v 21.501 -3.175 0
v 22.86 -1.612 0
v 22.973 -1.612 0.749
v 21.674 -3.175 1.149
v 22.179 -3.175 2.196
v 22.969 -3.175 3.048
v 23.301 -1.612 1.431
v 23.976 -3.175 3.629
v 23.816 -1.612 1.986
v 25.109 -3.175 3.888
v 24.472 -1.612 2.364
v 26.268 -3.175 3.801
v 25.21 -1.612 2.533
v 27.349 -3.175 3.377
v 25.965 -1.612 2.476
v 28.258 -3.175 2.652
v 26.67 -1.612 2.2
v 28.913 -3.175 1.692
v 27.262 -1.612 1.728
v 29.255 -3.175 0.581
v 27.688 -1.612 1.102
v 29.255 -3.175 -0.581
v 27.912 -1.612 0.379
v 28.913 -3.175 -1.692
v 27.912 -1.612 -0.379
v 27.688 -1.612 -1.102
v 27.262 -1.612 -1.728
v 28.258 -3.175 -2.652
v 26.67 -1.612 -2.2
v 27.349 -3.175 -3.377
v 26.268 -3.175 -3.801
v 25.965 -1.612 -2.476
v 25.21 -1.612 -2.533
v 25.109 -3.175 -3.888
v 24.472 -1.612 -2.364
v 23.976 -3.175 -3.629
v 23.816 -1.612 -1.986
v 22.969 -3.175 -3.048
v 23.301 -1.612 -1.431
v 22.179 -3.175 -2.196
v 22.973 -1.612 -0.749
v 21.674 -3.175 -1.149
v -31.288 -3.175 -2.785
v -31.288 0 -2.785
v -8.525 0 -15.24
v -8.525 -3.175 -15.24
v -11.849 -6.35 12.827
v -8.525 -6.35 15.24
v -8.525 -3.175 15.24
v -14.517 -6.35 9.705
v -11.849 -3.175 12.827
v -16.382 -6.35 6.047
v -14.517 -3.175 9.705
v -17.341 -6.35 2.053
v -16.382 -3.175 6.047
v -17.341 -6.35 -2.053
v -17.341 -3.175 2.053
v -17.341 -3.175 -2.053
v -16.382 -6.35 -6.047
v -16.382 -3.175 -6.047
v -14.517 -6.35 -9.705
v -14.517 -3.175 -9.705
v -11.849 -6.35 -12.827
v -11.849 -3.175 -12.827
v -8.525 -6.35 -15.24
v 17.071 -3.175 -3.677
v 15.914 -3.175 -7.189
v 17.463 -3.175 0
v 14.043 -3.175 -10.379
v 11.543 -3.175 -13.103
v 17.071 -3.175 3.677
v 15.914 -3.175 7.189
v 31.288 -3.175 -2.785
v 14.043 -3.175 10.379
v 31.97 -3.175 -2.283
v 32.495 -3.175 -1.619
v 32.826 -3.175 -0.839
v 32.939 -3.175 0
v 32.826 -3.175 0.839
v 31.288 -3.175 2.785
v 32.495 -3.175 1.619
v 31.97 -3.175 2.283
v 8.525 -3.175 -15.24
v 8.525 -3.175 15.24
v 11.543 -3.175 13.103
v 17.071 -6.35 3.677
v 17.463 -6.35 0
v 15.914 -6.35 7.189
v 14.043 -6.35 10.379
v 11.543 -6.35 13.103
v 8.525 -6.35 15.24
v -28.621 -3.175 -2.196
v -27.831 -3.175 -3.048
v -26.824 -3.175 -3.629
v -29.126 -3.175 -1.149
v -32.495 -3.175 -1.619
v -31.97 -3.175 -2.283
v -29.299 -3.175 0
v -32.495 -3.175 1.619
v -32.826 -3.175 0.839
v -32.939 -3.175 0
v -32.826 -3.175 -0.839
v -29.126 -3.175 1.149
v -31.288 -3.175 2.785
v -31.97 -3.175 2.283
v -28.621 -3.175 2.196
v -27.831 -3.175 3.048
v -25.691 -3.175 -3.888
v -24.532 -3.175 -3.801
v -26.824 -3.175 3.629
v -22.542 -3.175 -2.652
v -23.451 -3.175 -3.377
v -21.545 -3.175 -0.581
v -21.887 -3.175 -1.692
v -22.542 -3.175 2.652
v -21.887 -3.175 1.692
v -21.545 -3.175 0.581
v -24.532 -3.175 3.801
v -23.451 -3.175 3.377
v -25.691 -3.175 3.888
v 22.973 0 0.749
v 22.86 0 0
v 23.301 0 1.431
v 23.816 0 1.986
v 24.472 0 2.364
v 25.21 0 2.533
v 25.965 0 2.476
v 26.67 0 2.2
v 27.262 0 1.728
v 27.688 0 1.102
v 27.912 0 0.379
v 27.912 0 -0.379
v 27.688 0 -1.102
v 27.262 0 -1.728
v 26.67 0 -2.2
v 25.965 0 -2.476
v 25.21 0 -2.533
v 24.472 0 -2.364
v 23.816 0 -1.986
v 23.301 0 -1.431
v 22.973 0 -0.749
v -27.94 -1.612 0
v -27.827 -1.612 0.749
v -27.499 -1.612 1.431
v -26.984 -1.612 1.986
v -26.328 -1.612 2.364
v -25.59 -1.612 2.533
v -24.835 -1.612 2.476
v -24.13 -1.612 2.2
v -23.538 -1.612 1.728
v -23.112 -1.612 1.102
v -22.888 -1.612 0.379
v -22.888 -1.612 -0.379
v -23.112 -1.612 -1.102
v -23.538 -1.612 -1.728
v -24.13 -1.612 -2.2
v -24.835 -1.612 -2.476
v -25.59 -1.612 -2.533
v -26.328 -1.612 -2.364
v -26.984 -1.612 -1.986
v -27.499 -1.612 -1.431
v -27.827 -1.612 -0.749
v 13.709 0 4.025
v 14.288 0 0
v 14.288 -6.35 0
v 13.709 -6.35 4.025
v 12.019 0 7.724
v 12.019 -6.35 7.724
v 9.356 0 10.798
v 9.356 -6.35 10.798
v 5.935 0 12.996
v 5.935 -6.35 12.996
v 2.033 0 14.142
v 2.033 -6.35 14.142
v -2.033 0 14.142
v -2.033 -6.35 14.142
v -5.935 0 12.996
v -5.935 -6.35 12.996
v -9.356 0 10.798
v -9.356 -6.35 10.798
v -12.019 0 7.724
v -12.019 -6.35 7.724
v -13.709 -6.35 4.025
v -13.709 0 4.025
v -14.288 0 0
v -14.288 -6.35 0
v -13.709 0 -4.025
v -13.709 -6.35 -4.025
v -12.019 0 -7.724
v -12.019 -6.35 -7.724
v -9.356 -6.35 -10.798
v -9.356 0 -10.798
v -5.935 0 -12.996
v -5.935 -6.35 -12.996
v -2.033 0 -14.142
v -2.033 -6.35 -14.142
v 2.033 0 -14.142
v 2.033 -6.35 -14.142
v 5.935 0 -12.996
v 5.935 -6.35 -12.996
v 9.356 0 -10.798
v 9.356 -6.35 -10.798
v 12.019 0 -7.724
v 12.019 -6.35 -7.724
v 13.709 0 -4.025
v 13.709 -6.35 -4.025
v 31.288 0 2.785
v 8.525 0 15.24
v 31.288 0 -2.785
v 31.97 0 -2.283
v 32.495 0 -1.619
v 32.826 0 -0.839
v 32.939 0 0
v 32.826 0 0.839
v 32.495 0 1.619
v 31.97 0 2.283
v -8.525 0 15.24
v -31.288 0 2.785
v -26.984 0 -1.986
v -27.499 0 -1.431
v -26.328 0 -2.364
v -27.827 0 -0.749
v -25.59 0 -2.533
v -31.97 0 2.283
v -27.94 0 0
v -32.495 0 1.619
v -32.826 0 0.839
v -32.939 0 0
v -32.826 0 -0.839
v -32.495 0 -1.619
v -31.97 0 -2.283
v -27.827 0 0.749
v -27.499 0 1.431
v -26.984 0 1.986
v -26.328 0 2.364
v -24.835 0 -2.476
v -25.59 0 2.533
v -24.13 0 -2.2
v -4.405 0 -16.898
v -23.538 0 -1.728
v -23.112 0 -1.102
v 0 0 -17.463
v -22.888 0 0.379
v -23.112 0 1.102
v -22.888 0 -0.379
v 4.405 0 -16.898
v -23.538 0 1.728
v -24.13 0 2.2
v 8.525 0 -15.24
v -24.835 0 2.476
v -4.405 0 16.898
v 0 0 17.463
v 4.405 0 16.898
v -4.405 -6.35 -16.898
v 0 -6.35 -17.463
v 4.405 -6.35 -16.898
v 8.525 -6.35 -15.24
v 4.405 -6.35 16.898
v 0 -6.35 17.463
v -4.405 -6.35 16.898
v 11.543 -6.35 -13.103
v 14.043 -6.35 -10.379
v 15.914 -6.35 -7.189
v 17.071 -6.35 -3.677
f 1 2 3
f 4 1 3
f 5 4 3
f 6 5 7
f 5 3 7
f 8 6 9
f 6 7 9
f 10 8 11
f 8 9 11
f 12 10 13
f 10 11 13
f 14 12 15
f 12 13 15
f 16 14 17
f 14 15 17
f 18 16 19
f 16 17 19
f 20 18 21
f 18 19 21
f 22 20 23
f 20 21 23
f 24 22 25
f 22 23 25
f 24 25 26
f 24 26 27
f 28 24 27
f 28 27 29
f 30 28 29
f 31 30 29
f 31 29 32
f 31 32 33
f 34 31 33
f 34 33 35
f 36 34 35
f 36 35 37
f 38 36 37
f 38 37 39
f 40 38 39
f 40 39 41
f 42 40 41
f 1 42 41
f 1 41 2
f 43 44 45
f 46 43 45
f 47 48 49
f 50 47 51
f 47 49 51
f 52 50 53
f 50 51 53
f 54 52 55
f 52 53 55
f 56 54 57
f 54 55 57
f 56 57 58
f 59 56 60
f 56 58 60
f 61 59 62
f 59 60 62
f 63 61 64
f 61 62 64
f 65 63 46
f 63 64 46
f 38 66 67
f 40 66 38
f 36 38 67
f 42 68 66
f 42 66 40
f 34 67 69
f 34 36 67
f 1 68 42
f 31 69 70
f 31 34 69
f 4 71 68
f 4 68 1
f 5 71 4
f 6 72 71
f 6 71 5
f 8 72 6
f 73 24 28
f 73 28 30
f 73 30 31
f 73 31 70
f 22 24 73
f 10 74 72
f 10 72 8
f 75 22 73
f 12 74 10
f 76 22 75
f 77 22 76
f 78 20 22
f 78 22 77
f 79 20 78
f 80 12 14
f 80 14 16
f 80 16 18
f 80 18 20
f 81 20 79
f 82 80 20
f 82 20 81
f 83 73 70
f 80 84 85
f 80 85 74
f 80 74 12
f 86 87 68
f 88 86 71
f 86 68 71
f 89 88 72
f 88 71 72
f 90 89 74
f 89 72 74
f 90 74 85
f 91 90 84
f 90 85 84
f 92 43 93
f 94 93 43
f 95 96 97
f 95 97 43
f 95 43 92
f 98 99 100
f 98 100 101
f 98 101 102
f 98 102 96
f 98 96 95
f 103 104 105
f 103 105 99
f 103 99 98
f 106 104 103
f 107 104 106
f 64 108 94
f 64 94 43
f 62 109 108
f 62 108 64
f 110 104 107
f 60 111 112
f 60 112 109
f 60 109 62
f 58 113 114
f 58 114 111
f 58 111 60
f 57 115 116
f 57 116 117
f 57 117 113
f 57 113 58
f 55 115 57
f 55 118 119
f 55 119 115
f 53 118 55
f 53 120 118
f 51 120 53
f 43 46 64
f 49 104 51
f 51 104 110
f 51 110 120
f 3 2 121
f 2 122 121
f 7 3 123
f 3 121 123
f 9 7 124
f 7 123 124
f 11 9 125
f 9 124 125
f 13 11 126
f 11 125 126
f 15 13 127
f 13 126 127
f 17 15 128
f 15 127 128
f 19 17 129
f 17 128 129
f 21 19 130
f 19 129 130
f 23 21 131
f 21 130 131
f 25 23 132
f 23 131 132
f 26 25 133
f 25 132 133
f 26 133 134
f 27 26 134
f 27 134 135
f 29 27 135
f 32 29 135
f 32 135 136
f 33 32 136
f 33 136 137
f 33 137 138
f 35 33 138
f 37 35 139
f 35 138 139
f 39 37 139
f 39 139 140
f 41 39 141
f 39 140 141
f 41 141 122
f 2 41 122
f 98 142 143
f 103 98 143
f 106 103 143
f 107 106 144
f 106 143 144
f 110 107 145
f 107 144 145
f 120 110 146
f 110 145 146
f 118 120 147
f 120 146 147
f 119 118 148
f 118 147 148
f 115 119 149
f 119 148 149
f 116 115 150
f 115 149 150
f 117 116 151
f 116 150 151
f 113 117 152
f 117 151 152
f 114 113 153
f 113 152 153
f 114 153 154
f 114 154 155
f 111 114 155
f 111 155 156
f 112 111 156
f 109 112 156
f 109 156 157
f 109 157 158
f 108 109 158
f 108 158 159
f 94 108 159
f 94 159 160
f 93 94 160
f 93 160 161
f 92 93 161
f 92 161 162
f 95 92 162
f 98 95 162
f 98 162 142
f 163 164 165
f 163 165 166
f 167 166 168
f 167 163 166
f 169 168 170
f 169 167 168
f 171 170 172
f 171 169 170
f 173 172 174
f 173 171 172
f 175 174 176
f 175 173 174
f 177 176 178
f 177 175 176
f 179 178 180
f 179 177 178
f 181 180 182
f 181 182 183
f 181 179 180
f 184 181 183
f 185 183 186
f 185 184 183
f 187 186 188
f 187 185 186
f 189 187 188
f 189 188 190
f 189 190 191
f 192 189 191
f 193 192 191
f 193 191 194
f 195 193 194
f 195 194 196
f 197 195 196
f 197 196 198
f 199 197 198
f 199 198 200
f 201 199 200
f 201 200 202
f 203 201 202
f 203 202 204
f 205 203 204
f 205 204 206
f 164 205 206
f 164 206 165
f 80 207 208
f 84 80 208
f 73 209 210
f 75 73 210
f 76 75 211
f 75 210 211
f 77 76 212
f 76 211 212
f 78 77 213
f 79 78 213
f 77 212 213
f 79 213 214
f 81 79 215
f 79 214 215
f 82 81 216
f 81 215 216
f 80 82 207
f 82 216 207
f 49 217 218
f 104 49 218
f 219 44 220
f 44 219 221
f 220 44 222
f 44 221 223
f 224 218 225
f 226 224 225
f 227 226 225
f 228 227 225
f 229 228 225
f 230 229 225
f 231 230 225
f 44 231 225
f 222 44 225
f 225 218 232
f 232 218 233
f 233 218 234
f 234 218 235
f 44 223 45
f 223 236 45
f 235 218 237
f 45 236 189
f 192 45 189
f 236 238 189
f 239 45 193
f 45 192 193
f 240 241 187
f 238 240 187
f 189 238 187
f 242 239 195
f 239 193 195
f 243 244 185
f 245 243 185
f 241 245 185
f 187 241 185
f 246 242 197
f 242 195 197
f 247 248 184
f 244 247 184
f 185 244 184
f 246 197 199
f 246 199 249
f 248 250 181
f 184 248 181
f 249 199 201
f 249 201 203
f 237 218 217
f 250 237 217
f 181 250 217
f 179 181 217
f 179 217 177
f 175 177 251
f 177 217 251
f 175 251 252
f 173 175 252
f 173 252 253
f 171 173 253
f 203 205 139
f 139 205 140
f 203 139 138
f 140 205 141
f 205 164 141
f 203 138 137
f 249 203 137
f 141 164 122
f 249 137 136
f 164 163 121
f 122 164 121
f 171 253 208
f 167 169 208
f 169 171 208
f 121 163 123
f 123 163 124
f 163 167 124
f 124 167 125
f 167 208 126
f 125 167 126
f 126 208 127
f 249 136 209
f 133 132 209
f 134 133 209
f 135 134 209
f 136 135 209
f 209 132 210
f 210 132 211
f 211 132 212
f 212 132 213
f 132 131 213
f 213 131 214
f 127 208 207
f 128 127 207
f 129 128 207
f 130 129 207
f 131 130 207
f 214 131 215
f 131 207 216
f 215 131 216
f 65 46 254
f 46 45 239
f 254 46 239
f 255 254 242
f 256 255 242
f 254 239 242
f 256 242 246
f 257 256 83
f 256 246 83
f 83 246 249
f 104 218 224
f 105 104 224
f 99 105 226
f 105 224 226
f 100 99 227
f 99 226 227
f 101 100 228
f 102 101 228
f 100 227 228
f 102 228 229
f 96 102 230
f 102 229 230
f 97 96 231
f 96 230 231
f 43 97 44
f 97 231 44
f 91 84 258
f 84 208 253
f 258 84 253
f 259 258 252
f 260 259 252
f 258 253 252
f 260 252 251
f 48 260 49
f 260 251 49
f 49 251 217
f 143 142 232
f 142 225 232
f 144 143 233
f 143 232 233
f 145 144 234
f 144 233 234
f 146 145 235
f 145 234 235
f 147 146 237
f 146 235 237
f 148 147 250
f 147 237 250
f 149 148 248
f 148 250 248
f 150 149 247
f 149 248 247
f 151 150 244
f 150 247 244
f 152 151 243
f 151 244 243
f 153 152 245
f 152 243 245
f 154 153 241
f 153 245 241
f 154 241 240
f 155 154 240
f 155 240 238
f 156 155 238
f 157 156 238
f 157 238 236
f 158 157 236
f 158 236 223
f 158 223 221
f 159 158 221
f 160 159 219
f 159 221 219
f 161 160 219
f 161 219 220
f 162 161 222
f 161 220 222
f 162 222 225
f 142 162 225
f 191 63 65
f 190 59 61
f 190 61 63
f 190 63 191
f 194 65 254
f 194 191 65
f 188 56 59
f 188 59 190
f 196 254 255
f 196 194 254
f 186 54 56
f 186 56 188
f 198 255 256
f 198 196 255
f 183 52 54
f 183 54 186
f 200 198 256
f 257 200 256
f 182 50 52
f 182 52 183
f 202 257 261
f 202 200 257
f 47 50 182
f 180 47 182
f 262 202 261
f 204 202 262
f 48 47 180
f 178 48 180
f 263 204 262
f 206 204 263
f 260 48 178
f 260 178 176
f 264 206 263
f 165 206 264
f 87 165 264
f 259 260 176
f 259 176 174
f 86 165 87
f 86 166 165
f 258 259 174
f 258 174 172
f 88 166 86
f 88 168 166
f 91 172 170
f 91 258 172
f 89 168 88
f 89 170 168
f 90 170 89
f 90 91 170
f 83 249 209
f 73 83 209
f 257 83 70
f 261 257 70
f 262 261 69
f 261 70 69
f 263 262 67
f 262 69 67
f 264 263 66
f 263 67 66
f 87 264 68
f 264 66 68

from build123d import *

# Parameters (mm, degrees)
F0_R           = 14.2875
F1_DEPTH       = 3.175
F2_DEPTH       = 6.35
F4_D           = 5.08
F4_CSINK_D     = 7.7978
F4_CSINK_ANGLE = 82


with BuildPart() as f1:
    # F0 (on Front) → F1 (new body)
    with BuildSketch(Plane.XZ):
        with BuildLine():
            ThreePointArc((8.525333, -15.24), (15.063408, -8.833608), (17.4625, 0))
            ThreePointArc((17.4625, 0), (15.063408, 8.833608), (8.525333, 15.24))
            ThreePointArc((8.525333, 15.24), (0, 17.4625), (-8.525333, 15.24))
            ThreePointArc((-8.525333, 15.24), (-17.4625, 0), (-8.525333, -15.24))
            ThreePointArc((-8.525333, -15.24), (0, -17.4625), (8.525333, -15.24))
        make_face()
        Circle(F0_R, mode=Mode.SUBTRACT)
        with BuildLine():
            ThreePointArc((8.525333, 15.24), (15.063408, 8.833608), (17.4625, 0))
            ThreePointArc((17.4625, 0), (15.063408, -8.833608), (8.525333, -15.24))
            Line((8.525333, -15.24), (31.288024, -2.785327))
            ThreePointArc((31.288024, -2.785327), (32.939024, 0), (31.288024, 2.785327))
            Line((31.288024, 2.785327), (8.525333, 15.24))
        make_face()
        with BuildLine():
            ThreePointArc((-8.525333, -15.24), (-17.4625, 0), (-8.525333, 15.24))
            Line((-8.525333, 15.24), (-31.288024, 2.785327))
            ThreePointArc((-31.288024, 2.785327), (-32.939024, 0), (-31.288024, -2.785327))
            Line((-31.288024, -2.785327), (-8.525333, -15.24))
        make_face()
    extrude(amount=F1_DEPTH)

    # F0 (on Front) → F2 (join)
    with BuildSketch(Plane.XZ):
        with BuildLine():
            ThreePointArc((8.525333, -15.24), (15.063408, -8.833608), (17.4625, 0))
            ThreePointArc((17.4625, 0), (15.063408, 8.833608), (8.525333, 15.24))
            ThreePointArc((8.525333, 15.24), (0, 17.4625), (-8.525333, 15.24))
            ThreePointArc((-8.525333, 15.24), (-17.4625, 0), (-8.525333, -15.24))
            ThreePointArc((-8.525333, -15.24), (0, -17.4625), (8.525333, -15.24))
        make_face()
        Circle(F0_R, mode=Mode.SUBTRACT)
    extrude(amount=F2_DEPTH)

    # F4 (through all)
    with Locations(Plane.XZ.offset(3.175)):
        with Locations((-25.4, 0), (25.4, 0)):
            CounterSinkHole(F4_D / 2, F4_CSINK_D / 2, counter_sink_angle=F4_CSINK_ANGLE)


solid = f1.part
